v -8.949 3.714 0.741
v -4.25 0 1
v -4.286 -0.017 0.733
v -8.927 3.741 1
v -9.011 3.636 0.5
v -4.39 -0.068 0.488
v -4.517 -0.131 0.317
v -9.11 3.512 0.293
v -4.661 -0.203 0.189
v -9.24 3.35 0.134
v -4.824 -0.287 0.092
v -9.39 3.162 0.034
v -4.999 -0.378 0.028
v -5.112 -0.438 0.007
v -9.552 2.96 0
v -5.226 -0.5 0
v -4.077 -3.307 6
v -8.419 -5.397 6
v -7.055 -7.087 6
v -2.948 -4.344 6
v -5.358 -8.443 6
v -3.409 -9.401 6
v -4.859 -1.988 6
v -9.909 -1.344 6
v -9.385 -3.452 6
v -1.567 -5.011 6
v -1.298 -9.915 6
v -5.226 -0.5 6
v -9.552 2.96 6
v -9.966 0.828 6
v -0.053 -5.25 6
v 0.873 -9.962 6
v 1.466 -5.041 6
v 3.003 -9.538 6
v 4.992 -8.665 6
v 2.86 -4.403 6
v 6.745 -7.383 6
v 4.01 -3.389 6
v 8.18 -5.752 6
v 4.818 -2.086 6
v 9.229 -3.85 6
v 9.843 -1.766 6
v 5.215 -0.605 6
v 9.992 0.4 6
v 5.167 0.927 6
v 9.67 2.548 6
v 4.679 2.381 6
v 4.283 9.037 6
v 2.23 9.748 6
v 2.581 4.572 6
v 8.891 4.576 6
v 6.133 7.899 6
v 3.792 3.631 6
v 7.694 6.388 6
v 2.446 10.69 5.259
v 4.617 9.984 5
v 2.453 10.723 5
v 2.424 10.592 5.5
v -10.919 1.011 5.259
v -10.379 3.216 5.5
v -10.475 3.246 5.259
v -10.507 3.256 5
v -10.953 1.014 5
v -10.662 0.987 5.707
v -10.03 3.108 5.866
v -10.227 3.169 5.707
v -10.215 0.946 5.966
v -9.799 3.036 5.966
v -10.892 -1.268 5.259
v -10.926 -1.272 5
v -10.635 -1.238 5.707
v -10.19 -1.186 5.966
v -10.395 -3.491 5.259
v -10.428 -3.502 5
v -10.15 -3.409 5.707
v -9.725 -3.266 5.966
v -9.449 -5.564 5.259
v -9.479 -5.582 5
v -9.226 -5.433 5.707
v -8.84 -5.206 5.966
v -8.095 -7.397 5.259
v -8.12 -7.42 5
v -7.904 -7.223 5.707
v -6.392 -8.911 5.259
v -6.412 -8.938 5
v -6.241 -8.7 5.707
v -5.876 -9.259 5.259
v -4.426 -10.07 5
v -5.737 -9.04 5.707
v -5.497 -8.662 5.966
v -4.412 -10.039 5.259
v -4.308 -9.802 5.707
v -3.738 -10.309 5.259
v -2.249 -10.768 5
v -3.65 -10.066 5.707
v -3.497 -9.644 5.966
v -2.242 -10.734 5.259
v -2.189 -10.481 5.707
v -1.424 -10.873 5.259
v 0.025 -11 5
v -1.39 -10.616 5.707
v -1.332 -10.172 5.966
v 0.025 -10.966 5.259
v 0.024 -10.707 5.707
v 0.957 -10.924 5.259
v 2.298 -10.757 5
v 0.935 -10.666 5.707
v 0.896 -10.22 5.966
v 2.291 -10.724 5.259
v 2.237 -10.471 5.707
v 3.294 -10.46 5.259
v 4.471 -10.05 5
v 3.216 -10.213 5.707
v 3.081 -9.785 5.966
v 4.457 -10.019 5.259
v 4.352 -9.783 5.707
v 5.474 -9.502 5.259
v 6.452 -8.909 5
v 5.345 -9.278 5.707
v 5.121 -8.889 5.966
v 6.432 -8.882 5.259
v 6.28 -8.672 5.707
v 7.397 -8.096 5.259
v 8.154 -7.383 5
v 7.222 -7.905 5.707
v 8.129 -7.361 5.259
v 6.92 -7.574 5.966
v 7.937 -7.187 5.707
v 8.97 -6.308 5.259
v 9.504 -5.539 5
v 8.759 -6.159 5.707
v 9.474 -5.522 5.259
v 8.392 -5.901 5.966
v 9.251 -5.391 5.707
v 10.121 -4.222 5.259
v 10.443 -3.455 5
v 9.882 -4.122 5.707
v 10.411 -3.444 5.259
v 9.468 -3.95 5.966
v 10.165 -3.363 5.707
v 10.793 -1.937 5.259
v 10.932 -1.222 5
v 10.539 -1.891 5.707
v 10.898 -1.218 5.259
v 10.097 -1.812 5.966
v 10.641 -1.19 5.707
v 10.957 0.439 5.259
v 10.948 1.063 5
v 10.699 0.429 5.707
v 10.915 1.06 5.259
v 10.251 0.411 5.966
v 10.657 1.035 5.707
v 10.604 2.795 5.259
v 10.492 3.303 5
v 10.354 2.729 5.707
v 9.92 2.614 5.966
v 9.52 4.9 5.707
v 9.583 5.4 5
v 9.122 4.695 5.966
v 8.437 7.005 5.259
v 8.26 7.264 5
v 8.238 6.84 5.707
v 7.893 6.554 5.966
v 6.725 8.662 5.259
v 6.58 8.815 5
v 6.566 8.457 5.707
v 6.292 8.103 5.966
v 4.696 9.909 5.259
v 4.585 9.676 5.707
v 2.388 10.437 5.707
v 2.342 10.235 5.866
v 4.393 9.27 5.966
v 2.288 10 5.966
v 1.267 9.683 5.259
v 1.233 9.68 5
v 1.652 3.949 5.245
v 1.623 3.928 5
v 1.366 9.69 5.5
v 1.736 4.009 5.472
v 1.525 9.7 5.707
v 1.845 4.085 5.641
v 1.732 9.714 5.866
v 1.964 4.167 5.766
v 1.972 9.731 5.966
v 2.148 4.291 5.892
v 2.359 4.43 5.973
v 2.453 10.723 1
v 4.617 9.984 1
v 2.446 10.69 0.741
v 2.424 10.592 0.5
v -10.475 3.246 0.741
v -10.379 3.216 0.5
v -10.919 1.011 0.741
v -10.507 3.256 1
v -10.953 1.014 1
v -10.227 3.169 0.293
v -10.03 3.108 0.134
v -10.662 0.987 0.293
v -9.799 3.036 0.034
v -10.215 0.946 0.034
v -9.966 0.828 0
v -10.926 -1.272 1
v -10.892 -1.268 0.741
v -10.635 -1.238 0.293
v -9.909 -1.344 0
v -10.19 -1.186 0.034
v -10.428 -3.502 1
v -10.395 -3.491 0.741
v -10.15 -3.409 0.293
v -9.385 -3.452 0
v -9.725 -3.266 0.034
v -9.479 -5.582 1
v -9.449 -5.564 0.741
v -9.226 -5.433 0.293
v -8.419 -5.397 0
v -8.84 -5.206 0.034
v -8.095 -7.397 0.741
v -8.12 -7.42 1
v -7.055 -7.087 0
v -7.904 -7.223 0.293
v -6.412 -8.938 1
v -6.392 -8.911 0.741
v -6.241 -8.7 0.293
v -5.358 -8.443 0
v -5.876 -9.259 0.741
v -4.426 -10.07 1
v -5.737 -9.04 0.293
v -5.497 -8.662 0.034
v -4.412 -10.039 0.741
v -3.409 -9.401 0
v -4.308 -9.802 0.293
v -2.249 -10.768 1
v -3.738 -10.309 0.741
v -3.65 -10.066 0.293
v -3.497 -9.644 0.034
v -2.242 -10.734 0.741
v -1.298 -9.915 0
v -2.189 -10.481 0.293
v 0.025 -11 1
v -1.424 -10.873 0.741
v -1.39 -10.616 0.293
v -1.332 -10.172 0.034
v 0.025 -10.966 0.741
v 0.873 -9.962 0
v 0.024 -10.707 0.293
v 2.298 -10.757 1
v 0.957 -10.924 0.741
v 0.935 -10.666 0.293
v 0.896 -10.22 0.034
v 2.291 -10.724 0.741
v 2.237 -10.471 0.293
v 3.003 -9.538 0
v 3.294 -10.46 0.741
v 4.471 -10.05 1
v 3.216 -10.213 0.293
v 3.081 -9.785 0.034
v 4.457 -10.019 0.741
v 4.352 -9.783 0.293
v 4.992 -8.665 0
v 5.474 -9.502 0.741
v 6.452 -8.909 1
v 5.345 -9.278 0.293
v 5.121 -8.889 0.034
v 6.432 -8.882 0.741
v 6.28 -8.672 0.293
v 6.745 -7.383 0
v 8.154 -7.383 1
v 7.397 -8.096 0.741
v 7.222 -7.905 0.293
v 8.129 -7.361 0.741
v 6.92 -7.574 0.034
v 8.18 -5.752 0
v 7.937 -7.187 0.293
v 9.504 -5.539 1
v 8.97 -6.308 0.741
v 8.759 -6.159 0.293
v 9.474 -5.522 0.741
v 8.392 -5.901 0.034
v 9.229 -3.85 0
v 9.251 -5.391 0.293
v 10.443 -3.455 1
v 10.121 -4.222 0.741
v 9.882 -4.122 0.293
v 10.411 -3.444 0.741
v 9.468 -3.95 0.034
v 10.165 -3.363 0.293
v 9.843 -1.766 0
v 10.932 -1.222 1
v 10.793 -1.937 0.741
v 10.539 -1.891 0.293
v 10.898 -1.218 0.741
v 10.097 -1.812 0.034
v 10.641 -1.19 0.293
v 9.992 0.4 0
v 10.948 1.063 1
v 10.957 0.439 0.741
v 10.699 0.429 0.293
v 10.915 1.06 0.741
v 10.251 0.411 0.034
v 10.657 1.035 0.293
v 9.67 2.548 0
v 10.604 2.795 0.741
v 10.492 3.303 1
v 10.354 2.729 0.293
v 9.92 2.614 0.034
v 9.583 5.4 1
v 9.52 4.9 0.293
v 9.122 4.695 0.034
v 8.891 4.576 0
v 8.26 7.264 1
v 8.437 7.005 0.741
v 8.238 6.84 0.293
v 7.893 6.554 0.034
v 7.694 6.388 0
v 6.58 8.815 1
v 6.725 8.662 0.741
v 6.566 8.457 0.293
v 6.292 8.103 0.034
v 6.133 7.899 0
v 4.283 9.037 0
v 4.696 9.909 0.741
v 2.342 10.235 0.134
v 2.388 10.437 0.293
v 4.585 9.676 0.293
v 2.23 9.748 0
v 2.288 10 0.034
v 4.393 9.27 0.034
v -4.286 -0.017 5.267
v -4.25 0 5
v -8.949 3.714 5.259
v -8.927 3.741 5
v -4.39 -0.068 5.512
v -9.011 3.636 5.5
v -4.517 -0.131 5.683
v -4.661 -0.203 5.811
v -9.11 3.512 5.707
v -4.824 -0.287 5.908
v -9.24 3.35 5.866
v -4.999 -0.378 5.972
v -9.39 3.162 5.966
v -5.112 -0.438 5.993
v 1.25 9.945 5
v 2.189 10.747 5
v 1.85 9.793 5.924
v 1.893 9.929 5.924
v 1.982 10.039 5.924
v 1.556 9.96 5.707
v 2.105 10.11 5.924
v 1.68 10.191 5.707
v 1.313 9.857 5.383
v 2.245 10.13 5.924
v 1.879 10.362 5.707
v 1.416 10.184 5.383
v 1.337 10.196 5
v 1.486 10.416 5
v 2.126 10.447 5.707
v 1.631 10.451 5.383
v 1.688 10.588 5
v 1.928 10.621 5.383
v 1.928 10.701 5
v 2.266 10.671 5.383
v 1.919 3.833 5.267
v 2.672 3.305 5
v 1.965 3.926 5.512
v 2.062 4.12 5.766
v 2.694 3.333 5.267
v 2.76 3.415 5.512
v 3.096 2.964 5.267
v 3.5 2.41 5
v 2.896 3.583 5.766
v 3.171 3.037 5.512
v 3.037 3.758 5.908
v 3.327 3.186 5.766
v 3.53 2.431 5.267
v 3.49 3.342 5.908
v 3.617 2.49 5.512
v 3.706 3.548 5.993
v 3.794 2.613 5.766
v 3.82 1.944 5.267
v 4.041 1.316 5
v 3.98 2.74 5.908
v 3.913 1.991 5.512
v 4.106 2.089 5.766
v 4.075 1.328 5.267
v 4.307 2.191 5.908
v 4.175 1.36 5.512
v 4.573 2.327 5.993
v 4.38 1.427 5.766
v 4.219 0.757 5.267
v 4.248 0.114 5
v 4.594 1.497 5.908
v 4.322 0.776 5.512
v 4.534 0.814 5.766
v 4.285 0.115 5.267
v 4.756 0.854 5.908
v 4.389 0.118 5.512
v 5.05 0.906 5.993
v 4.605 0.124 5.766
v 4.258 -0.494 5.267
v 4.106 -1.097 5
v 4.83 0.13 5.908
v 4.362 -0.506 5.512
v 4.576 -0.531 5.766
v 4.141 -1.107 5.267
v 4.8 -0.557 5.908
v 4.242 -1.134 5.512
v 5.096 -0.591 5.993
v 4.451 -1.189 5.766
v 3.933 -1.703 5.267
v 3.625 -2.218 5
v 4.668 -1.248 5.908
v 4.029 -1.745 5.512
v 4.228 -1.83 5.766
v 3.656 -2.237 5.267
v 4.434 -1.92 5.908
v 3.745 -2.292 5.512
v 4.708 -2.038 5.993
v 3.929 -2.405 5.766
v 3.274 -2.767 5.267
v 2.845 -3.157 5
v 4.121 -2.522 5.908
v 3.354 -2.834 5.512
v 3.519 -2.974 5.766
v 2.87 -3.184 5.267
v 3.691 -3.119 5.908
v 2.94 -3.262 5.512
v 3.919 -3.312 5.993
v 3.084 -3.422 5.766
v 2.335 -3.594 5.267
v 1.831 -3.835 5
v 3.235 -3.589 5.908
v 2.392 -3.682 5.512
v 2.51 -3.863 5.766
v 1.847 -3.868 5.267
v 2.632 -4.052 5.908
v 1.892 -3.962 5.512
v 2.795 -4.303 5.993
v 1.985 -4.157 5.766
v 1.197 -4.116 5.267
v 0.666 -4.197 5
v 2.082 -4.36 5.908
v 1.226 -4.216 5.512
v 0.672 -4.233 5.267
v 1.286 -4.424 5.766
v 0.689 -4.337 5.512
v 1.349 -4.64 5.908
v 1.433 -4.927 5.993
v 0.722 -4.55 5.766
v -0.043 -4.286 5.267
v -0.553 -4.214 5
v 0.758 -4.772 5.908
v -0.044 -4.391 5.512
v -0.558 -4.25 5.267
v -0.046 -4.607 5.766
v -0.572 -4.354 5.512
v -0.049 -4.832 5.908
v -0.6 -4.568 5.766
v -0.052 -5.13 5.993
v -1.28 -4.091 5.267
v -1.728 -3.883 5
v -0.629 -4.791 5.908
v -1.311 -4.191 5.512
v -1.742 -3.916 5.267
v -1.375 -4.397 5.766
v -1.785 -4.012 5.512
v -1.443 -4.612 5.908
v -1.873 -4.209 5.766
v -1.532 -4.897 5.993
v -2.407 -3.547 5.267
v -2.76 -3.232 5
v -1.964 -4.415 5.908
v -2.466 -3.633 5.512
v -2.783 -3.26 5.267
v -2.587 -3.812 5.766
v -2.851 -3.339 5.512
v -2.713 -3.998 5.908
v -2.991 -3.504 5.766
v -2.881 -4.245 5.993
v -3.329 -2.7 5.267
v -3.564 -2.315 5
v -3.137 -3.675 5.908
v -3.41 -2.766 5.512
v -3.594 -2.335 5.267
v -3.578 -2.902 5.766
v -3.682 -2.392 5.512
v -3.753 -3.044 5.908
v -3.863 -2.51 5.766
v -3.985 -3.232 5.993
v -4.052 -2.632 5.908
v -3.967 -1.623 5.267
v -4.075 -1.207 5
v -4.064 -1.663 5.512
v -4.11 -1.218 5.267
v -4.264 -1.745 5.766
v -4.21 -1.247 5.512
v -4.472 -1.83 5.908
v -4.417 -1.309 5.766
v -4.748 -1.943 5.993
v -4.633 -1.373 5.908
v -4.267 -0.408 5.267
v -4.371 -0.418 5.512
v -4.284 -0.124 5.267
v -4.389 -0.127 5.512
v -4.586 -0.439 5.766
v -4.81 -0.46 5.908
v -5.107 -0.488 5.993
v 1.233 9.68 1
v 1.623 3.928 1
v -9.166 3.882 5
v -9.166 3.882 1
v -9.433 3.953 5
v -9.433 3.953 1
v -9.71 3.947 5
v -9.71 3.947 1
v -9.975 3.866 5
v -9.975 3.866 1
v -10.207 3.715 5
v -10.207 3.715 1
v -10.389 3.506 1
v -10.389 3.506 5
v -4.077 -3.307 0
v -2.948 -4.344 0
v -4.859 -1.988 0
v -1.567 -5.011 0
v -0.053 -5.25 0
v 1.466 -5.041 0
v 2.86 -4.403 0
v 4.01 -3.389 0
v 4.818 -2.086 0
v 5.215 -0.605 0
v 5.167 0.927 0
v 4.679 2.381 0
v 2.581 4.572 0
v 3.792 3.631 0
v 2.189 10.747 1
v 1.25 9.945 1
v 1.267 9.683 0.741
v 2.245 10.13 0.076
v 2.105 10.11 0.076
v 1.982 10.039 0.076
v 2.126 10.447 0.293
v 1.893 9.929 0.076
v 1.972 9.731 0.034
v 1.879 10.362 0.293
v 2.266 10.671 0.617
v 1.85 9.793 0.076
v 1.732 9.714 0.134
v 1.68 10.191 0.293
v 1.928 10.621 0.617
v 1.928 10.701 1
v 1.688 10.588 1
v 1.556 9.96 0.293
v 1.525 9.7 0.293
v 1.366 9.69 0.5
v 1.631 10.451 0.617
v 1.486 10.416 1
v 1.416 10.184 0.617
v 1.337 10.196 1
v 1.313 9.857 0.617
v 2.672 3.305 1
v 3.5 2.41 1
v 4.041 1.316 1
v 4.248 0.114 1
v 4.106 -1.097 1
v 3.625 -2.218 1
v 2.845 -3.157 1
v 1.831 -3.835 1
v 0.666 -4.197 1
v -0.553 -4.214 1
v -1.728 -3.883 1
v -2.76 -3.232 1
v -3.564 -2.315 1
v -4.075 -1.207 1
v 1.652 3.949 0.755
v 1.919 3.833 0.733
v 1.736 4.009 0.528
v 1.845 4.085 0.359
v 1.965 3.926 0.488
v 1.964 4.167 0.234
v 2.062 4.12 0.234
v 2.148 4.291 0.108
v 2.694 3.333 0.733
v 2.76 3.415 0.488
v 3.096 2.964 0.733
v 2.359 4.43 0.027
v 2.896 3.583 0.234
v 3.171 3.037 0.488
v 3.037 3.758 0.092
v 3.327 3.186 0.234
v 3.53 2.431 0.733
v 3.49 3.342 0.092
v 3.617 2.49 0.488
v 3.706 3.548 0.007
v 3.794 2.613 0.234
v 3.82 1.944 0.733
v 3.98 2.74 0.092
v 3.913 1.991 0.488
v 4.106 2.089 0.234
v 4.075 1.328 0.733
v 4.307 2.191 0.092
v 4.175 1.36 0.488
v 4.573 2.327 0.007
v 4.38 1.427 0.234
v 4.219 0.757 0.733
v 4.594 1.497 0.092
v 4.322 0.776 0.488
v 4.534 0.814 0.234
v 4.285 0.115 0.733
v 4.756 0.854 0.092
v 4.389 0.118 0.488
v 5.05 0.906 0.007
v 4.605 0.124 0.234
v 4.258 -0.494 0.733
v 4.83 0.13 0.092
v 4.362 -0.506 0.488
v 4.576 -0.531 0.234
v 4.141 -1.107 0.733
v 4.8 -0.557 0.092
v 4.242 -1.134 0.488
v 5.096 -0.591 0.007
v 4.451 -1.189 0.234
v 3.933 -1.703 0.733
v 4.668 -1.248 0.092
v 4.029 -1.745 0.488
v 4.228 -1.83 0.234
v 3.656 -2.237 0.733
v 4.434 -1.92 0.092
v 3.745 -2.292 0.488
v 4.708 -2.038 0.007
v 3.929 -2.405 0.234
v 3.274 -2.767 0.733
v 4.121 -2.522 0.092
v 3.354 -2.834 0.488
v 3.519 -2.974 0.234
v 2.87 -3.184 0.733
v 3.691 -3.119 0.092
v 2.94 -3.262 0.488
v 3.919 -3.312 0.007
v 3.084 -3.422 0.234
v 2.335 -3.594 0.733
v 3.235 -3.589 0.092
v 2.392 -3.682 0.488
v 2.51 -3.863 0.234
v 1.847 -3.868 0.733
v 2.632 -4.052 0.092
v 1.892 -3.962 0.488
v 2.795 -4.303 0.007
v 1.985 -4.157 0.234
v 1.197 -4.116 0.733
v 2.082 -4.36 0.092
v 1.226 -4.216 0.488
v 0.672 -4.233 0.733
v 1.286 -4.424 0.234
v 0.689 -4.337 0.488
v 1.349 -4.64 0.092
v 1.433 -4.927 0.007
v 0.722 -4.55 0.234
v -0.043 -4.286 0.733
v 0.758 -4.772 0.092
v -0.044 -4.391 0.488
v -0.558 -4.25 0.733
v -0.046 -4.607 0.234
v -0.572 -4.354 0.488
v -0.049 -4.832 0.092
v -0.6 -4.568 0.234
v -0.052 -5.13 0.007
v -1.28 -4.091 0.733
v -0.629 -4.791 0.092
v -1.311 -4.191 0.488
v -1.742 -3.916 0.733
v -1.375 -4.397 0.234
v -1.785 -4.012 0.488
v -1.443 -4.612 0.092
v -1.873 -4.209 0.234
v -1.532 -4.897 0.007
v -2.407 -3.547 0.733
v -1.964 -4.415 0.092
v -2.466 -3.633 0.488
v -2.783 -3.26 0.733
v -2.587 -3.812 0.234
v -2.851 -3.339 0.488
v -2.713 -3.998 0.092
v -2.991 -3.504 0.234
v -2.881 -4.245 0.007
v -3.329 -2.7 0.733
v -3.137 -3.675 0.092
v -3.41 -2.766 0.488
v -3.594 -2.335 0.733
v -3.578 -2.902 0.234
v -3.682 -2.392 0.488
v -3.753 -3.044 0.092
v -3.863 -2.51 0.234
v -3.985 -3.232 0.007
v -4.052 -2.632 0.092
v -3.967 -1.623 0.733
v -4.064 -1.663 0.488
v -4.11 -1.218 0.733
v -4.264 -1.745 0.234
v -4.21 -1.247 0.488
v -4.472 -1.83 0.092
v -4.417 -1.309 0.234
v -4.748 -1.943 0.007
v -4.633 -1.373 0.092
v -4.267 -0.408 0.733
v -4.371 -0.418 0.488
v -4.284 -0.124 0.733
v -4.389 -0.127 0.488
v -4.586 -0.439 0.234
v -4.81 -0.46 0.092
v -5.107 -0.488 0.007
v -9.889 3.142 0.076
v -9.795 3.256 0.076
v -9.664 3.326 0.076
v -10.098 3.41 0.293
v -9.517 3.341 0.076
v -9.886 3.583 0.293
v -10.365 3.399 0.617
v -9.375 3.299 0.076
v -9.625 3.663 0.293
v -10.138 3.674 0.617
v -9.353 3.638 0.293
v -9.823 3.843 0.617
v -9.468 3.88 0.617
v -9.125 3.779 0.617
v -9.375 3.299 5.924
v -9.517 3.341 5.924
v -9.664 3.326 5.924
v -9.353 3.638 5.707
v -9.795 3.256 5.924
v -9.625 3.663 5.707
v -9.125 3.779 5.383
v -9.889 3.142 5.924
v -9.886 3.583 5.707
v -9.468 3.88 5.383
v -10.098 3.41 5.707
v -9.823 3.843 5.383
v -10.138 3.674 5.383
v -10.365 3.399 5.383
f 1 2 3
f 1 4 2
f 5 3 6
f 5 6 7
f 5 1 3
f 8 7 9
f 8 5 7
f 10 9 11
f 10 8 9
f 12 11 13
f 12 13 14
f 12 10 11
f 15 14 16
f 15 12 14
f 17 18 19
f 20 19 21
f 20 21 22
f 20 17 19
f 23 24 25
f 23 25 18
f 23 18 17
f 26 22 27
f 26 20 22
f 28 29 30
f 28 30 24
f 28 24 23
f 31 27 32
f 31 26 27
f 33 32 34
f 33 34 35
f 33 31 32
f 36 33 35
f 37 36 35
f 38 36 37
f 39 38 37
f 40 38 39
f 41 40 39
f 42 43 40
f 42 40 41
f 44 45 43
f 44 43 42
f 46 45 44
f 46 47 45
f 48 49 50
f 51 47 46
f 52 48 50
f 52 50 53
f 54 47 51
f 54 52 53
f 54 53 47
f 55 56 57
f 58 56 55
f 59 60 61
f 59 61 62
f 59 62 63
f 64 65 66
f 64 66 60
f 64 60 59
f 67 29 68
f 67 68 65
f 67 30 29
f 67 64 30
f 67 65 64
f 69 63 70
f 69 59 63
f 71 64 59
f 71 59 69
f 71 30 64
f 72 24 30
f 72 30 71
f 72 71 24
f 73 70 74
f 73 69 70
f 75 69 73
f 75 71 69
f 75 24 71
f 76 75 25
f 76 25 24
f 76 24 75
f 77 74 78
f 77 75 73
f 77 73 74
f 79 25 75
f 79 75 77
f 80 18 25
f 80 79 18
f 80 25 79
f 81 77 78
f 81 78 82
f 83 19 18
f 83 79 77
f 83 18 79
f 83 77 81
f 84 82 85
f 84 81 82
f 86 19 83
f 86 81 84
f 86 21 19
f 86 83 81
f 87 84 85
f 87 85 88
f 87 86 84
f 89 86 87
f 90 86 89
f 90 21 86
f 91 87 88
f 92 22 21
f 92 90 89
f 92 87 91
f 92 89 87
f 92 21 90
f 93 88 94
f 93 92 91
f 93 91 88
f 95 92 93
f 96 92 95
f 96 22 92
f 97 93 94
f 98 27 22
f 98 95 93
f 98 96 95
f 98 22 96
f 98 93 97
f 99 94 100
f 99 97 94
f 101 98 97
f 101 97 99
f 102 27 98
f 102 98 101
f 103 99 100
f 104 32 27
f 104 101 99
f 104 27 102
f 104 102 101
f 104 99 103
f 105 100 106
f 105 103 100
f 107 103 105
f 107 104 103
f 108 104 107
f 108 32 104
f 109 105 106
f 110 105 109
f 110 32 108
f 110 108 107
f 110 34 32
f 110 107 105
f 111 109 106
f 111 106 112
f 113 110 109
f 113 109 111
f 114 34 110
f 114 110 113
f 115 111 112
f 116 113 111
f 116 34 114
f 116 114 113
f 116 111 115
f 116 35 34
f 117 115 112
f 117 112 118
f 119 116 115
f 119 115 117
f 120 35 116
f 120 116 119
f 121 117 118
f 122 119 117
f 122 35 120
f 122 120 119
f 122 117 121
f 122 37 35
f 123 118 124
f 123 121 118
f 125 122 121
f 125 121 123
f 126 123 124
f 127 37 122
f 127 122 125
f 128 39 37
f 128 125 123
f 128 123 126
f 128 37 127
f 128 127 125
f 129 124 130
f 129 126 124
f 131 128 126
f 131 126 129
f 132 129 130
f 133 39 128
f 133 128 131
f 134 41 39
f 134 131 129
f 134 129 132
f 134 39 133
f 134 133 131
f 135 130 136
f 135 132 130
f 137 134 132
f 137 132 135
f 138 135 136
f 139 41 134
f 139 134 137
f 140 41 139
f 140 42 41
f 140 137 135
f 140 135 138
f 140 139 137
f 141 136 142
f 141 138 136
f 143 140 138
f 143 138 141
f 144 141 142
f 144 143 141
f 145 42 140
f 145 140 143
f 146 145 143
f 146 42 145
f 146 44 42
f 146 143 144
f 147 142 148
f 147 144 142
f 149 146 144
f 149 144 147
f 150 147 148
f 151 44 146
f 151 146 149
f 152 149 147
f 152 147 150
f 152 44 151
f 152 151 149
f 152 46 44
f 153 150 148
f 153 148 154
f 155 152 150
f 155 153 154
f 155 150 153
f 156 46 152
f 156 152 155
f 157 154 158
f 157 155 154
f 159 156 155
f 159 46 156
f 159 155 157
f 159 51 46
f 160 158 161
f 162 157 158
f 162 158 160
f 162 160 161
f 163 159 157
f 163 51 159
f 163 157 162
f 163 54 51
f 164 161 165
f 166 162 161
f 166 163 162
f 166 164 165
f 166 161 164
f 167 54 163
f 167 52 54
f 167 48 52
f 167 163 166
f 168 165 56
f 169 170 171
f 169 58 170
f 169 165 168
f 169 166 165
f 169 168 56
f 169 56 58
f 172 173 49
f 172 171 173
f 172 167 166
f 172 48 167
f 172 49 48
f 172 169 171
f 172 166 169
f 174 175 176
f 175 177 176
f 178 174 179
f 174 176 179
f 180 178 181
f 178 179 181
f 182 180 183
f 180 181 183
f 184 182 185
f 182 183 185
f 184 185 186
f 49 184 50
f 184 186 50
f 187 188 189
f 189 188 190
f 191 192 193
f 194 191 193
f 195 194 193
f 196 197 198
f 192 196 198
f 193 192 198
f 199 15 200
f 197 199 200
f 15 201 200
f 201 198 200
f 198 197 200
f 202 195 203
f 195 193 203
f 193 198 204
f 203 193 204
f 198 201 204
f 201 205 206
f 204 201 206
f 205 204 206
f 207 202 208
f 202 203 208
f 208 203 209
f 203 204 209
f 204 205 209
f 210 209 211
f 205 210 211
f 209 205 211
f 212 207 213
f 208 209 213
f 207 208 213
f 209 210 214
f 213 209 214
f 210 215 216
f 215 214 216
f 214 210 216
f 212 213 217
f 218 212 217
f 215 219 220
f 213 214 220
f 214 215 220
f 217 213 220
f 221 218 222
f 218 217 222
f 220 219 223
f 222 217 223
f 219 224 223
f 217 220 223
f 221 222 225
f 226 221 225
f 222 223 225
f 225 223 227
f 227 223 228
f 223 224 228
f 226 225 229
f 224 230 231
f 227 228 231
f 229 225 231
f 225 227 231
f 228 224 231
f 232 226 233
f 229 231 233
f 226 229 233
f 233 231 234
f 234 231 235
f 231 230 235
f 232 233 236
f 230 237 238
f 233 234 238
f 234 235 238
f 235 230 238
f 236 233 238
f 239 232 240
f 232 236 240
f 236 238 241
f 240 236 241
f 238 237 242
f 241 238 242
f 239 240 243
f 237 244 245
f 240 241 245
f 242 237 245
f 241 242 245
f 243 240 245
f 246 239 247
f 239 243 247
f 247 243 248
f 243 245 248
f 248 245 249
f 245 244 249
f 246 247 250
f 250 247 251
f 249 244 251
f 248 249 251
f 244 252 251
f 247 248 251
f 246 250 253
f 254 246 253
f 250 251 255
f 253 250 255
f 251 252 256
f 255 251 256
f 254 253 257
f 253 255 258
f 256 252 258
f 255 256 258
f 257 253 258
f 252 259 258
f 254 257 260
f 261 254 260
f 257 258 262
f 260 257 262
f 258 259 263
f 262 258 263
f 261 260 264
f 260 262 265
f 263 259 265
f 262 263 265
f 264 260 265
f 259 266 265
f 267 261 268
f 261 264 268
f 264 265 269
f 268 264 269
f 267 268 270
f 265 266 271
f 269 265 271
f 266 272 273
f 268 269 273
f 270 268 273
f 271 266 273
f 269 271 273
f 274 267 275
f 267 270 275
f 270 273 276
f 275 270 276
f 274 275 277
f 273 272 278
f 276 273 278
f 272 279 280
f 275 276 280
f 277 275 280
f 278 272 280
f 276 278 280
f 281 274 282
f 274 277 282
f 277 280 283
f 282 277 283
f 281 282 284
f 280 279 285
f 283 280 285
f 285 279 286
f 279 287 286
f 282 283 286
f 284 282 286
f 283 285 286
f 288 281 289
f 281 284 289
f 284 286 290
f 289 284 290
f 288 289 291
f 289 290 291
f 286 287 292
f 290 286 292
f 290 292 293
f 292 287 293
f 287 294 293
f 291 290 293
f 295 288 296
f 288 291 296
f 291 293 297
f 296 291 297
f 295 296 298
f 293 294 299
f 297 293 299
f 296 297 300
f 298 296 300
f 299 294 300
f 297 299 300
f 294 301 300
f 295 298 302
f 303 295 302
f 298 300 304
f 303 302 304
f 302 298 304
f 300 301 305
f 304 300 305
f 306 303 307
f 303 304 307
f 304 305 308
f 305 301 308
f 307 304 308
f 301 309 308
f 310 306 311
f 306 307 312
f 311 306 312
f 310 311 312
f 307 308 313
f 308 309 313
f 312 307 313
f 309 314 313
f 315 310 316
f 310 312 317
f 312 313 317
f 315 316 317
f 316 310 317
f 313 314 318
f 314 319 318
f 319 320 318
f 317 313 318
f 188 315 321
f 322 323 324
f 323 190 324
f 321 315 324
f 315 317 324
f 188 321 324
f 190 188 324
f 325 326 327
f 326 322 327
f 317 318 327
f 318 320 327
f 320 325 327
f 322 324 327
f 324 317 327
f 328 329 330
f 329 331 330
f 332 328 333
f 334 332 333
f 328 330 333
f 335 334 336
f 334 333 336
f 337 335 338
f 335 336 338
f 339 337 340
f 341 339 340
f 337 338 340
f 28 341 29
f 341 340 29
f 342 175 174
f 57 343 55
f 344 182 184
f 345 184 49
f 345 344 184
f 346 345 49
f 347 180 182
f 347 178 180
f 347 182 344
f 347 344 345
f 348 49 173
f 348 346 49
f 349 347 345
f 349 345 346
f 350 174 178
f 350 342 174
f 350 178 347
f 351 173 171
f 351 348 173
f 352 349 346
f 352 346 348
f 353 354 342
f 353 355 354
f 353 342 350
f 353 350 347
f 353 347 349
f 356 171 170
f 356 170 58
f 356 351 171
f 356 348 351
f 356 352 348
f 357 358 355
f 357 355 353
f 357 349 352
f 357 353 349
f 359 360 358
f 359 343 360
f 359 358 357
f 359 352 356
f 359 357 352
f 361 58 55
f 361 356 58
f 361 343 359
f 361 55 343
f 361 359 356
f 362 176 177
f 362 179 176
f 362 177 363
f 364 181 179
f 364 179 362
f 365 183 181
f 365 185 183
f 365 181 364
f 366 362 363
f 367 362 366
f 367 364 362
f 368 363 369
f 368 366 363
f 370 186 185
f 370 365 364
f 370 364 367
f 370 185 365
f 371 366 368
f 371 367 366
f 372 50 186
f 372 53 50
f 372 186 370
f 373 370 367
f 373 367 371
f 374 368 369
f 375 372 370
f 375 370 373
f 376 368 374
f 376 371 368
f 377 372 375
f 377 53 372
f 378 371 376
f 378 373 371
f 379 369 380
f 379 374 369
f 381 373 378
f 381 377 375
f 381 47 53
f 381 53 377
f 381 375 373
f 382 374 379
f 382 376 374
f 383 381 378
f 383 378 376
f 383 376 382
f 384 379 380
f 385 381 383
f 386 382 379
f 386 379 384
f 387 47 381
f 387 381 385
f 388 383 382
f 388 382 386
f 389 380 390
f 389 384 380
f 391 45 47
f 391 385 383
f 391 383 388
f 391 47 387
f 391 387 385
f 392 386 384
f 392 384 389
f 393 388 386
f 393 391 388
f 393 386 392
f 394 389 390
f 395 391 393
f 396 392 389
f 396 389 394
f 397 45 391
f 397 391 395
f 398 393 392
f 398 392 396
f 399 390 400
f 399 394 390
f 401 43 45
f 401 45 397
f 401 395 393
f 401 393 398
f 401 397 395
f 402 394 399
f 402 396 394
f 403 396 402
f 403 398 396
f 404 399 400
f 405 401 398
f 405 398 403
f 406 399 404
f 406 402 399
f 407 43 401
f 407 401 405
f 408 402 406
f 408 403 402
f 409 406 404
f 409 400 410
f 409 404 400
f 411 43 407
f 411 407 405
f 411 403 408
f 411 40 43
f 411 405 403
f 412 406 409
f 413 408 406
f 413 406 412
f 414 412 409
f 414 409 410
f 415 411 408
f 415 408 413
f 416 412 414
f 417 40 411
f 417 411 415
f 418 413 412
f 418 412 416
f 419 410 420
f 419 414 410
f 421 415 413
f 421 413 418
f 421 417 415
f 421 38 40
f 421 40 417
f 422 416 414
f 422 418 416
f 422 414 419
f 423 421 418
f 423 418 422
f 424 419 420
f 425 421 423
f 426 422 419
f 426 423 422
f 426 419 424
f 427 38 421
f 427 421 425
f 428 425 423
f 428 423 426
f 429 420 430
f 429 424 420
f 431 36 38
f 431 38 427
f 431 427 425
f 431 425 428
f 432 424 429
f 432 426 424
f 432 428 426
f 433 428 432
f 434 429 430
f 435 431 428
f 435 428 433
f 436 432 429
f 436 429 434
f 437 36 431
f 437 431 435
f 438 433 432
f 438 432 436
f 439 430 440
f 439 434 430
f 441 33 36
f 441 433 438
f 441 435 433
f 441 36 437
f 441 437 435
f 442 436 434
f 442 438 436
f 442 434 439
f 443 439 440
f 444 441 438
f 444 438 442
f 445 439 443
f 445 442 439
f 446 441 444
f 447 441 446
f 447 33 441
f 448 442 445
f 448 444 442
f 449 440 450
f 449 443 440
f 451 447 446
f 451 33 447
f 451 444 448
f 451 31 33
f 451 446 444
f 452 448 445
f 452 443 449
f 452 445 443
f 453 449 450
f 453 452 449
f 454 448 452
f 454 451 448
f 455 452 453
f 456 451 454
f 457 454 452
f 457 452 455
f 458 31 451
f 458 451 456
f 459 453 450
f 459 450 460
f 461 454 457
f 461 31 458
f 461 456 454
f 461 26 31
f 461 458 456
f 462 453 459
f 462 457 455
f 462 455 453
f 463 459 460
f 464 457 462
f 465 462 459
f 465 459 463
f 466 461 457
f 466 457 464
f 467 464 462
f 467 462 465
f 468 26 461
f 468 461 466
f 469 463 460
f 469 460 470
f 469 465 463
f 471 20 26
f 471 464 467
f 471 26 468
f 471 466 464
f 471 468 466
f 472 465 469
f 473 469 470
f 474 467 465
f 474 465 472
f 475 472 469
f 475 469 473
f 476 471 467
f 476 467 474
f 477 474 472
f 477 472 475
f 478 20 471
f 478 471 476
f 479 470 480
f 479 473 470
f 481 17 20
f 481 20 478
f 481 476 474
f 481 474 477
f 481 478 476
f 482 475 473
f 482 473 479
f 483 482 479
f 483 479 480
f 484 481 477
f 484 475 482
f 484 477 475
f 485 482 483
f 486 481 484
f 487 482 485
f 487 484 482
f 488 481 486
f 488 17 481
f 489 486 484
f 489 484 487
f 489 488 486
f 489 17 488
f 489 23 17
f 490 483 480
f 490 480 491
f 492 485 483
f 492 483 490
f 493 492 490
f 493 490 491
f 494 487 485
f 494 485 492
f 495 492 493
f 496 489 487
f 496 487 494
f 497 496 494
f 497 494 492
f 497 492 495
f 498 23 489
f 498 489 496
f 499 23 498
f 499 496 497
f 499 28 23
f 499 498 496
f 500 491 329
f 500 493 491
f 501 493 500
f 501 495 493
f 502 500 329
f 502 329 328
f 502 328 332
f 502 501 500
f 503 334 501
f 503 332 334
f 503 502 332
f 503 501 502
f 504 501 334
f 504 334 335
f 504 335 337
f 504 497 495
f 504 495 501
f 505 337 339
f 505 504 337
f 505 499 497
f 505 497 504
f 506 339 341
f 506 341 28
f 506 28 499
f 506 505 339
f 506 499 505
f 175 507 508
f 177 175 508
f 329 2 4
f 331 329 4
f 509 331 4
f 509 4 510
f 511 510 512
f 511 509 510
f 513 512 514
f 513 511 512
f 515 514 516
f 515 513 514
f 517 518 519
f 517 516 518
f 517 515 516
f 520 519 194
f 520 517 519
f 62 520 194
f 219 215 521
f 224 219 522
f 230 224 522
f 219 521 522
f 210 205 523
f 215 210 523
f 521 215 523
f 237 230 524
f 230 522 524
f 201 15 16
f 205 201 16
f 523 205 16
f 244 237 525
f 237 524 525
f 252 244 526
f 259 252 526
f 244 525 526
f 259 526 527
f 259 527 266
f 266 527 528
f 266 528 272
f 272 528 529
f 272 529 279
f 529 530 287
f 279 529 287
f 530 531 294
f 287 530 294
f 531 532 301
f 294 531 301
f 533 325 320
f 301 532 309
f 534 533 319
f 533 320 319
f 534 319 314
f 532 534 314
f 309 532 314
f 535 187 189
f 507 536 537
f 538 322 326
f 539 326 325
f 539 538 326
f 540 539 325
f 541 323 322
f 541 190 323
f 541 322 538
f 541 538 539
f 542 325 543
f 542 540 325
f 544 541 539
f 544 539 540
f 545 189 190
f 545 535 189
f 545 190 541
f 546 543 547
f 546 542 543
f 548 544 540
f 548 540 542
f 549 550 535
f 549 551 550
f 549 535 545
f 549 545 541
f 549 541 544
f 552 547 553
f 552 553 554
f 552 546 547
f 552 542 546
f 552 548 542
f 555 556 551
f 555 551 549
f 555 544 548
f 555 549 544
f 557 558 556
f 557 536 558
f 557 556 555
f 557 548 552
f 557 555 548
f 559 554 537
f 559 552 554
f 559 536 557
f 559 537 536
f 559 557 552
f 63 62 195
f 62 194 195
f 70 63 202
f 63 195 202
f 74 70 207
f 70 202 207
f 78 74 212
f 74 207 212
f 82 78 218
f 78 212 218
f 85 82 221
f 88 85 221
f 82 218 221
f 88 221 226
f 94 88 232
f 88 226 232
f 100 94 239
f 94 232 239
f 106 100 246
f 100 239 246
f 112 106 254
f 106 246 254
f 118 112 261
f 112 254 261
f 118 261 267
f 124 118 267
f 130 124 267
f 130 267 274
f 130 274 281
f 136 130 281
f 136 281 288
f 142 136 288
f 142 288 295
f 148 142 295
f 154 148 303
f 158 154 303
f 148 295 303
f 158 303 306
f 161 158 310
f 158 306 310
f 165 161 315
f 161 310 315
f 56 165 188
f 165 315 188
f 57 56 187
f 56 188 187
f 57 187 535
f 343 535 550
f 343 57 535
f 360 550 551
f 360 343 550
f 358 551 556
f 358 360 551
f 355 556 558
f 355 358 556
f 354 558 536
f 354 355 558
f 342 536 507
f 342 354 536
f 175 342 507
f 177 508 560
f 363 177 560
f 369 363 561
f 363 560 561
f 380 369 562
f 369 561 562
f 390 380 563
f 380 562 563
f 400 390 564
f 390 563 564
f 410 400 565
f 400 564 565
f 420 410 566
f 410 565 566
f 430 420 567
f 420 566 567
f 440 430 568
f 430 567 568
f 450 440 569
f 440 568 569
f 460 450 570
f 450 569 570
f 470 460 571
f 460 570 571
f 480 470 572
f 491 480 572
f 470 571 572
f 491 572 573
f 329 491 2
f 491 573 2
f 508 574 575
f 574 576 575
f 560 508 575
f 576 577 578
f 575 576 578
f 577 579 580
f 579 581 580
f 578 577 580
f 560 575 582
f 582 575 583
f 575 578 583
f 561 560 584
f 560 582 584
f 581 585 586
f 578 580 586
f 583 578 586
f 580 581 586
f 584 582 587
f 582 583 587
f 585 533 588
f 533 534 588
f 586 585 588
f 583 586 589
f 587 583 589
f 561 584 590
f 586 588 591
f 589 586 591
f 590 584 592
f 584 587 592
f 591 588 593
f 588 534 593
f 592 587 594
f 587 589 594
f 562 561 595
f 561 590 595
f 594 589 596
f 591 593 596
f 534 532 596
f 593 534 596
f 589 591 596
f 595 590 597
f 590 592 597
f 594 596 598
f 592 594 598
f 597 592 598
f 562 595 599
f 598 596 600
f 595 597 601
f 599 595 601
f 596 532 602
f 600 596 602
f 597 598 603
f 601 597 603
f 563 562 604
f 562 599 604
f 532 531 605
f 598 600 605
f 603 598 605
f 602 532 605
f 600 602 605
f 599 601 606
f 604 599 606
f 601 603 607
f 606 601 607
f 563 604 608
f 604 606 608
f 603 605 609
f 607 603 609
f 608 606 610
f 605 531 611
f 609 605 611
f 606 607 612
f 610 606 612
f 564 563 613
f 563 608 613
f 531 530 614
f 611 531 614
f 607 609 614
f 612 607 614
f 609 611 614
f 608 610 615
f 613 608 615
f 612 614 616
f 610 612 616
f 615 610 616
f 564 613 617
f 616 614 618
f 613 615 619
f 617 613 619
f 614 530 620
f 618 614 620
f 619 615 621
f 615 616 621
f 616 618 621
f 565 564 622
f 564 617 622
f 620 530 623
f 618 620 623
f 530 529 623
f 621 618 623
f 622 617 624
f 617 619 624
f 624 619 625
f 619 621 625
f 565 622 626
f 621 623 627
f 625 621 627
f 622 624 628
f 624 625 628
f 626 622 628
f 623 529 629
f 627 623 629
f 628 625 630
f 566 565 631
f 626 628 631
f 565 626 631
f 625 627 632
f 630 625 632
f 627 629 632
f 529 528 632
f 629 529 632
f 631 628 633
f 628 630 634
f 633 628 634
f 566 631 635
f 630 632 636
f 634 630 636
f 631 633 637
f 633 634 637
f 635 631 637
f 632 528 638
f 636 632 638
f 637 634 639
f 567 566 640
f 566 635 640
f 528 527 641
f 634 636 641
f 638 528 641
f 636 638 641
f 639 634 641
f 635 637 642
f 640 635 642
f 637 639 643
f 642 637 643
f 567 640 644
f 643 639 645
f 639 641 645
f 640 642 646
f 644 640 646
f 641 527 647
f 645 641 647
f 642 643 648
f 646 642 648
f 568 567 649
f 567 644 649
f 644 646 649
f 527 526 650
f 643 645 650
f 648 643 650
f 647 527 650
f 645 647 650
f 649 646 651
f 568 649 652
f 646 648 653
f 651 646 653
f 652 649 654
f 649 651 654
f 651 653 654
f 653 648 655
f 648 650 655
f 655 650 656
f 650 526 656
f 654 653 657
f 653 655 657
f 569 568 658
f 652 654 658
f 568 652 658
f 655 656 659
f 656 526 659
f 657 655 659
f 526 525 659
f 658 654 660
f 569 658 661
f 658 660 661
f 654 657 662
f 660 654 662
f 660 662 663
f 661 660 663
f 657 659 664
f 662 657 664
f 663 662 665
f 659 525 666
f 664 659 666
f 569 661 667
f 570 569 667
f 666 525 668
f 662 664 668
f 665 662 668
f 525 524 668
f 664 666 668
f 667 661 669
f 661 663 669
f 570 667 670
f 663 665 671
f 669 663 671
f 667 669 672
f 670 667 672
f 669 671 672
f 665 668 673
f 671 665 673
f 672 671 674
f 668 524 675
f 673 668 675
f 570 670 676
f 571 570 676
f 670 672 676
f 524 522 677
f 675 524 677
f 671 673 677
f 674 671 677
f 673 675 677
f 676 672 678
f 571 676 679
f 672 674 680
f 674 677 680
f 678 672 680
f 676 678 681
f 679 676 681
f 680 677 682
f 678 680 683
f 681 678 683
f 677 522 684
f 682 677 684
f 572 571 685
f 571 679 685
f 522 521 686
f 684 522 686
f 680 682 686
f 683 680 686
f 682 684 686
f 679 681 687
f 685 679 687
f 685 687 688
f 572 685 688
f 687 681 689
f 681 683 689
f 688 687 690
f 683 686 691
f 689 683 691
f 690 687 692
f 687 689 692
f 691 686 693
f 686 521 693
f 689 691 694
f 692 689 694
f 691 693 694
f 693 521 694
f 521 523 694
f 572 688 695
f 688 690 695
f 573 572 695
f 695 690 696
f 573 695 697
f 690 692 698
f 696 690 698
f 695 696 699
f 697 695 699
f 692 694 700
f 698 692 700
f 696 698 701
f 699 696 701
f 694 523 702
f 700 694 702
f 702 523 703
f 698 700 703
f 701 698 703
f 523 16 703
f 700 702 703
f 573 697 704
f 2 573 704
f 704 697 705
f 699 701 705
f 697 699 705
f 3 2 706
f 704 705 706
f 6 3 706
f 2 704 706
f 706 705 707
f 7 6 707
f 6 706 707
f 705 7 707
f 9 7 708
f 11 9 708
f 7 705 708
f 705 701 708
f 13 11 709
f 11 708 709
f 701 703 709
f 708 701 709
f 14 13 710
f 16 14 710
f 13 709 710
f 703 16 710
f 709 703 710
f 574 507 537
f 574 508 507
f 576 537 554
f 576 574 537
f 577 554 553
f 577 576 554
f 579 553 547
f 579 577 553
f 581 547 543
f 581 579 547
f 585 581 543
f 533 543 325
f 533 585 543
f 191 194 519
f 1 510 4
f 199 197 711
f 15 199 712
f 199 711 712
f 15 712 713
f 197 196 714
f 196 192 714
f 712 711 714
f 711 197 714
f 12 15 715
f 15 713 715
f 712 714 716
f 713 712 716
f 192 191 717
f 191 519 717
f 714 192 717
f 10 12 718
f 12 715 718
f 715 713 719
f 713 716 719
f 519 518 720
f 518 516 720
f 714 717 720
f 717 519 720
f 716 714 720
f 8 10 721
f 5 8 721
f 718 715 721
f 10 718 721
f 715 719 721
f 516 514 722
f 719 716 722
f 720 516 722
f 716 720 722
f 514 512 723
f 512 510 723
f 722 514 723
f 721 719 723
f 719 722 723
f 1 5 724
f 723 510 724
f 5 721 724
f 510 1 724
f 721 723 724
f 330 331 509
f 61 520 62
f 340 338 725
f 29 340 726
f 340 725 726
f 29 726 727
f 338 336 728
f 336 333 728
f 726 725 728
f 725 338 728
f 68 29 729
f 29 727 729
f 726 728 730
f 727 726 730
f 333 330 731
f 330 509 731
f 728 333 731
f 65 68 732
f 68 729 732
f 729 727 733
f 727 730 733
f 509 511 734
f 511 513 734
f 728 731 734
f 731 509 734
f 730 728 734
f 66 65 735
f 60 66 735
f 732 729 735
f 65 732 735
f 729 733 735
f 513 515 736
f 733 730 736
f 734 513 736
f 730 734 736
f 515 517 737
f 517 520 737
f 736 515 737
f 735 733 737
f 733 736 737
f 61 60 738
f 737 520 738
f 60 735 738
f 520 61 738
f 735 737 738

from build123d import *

# Parameters (mm, degrees)
F1_DEPTH = 6
F2_R     = 1


with BuildPart() as f1:
    # F0 (on Top) → F1 (new body)
    with BuildSketch(Plane.XY):
        with BuildLine():
            Line((-4.25, 0), (-9.994602, 4.594337))
            ThreePointArc((-9.994602, 4.594337), (5.443818, -9.558496), (1.147387, 10.939996))
            Line((1.147387, 10.939996), (1.622562, 3.928078))
            ThreePointArc((1.622562, 3.928078), (2.362902, -3.53259), (-4.25, 0))
        make_face()
    extrude(amount=F1_DEPTH)

    # F2
    f2_edges = [f1.edges().sort_by_distance(p)[0] for p in [
        (5.443818, -9.558496, 6),
        (2.362902, -3.53259, 6),
        (2.362902, -3.53259, 0),
        (5.443818, -9.558496, 0),
        (-7.122301, 2.297168, 0),
        (-9.994602, 4.594337, 3),
        (-7.122301, 2.297168, 6),
        (1.384974, 7.434037, 0),
        (1.147387, 10.939996, 3),
        (1.384974, 7.434037, 6),
    ]]
    fillet(f2_edges, radius=F2_R)


solid = f1.part
